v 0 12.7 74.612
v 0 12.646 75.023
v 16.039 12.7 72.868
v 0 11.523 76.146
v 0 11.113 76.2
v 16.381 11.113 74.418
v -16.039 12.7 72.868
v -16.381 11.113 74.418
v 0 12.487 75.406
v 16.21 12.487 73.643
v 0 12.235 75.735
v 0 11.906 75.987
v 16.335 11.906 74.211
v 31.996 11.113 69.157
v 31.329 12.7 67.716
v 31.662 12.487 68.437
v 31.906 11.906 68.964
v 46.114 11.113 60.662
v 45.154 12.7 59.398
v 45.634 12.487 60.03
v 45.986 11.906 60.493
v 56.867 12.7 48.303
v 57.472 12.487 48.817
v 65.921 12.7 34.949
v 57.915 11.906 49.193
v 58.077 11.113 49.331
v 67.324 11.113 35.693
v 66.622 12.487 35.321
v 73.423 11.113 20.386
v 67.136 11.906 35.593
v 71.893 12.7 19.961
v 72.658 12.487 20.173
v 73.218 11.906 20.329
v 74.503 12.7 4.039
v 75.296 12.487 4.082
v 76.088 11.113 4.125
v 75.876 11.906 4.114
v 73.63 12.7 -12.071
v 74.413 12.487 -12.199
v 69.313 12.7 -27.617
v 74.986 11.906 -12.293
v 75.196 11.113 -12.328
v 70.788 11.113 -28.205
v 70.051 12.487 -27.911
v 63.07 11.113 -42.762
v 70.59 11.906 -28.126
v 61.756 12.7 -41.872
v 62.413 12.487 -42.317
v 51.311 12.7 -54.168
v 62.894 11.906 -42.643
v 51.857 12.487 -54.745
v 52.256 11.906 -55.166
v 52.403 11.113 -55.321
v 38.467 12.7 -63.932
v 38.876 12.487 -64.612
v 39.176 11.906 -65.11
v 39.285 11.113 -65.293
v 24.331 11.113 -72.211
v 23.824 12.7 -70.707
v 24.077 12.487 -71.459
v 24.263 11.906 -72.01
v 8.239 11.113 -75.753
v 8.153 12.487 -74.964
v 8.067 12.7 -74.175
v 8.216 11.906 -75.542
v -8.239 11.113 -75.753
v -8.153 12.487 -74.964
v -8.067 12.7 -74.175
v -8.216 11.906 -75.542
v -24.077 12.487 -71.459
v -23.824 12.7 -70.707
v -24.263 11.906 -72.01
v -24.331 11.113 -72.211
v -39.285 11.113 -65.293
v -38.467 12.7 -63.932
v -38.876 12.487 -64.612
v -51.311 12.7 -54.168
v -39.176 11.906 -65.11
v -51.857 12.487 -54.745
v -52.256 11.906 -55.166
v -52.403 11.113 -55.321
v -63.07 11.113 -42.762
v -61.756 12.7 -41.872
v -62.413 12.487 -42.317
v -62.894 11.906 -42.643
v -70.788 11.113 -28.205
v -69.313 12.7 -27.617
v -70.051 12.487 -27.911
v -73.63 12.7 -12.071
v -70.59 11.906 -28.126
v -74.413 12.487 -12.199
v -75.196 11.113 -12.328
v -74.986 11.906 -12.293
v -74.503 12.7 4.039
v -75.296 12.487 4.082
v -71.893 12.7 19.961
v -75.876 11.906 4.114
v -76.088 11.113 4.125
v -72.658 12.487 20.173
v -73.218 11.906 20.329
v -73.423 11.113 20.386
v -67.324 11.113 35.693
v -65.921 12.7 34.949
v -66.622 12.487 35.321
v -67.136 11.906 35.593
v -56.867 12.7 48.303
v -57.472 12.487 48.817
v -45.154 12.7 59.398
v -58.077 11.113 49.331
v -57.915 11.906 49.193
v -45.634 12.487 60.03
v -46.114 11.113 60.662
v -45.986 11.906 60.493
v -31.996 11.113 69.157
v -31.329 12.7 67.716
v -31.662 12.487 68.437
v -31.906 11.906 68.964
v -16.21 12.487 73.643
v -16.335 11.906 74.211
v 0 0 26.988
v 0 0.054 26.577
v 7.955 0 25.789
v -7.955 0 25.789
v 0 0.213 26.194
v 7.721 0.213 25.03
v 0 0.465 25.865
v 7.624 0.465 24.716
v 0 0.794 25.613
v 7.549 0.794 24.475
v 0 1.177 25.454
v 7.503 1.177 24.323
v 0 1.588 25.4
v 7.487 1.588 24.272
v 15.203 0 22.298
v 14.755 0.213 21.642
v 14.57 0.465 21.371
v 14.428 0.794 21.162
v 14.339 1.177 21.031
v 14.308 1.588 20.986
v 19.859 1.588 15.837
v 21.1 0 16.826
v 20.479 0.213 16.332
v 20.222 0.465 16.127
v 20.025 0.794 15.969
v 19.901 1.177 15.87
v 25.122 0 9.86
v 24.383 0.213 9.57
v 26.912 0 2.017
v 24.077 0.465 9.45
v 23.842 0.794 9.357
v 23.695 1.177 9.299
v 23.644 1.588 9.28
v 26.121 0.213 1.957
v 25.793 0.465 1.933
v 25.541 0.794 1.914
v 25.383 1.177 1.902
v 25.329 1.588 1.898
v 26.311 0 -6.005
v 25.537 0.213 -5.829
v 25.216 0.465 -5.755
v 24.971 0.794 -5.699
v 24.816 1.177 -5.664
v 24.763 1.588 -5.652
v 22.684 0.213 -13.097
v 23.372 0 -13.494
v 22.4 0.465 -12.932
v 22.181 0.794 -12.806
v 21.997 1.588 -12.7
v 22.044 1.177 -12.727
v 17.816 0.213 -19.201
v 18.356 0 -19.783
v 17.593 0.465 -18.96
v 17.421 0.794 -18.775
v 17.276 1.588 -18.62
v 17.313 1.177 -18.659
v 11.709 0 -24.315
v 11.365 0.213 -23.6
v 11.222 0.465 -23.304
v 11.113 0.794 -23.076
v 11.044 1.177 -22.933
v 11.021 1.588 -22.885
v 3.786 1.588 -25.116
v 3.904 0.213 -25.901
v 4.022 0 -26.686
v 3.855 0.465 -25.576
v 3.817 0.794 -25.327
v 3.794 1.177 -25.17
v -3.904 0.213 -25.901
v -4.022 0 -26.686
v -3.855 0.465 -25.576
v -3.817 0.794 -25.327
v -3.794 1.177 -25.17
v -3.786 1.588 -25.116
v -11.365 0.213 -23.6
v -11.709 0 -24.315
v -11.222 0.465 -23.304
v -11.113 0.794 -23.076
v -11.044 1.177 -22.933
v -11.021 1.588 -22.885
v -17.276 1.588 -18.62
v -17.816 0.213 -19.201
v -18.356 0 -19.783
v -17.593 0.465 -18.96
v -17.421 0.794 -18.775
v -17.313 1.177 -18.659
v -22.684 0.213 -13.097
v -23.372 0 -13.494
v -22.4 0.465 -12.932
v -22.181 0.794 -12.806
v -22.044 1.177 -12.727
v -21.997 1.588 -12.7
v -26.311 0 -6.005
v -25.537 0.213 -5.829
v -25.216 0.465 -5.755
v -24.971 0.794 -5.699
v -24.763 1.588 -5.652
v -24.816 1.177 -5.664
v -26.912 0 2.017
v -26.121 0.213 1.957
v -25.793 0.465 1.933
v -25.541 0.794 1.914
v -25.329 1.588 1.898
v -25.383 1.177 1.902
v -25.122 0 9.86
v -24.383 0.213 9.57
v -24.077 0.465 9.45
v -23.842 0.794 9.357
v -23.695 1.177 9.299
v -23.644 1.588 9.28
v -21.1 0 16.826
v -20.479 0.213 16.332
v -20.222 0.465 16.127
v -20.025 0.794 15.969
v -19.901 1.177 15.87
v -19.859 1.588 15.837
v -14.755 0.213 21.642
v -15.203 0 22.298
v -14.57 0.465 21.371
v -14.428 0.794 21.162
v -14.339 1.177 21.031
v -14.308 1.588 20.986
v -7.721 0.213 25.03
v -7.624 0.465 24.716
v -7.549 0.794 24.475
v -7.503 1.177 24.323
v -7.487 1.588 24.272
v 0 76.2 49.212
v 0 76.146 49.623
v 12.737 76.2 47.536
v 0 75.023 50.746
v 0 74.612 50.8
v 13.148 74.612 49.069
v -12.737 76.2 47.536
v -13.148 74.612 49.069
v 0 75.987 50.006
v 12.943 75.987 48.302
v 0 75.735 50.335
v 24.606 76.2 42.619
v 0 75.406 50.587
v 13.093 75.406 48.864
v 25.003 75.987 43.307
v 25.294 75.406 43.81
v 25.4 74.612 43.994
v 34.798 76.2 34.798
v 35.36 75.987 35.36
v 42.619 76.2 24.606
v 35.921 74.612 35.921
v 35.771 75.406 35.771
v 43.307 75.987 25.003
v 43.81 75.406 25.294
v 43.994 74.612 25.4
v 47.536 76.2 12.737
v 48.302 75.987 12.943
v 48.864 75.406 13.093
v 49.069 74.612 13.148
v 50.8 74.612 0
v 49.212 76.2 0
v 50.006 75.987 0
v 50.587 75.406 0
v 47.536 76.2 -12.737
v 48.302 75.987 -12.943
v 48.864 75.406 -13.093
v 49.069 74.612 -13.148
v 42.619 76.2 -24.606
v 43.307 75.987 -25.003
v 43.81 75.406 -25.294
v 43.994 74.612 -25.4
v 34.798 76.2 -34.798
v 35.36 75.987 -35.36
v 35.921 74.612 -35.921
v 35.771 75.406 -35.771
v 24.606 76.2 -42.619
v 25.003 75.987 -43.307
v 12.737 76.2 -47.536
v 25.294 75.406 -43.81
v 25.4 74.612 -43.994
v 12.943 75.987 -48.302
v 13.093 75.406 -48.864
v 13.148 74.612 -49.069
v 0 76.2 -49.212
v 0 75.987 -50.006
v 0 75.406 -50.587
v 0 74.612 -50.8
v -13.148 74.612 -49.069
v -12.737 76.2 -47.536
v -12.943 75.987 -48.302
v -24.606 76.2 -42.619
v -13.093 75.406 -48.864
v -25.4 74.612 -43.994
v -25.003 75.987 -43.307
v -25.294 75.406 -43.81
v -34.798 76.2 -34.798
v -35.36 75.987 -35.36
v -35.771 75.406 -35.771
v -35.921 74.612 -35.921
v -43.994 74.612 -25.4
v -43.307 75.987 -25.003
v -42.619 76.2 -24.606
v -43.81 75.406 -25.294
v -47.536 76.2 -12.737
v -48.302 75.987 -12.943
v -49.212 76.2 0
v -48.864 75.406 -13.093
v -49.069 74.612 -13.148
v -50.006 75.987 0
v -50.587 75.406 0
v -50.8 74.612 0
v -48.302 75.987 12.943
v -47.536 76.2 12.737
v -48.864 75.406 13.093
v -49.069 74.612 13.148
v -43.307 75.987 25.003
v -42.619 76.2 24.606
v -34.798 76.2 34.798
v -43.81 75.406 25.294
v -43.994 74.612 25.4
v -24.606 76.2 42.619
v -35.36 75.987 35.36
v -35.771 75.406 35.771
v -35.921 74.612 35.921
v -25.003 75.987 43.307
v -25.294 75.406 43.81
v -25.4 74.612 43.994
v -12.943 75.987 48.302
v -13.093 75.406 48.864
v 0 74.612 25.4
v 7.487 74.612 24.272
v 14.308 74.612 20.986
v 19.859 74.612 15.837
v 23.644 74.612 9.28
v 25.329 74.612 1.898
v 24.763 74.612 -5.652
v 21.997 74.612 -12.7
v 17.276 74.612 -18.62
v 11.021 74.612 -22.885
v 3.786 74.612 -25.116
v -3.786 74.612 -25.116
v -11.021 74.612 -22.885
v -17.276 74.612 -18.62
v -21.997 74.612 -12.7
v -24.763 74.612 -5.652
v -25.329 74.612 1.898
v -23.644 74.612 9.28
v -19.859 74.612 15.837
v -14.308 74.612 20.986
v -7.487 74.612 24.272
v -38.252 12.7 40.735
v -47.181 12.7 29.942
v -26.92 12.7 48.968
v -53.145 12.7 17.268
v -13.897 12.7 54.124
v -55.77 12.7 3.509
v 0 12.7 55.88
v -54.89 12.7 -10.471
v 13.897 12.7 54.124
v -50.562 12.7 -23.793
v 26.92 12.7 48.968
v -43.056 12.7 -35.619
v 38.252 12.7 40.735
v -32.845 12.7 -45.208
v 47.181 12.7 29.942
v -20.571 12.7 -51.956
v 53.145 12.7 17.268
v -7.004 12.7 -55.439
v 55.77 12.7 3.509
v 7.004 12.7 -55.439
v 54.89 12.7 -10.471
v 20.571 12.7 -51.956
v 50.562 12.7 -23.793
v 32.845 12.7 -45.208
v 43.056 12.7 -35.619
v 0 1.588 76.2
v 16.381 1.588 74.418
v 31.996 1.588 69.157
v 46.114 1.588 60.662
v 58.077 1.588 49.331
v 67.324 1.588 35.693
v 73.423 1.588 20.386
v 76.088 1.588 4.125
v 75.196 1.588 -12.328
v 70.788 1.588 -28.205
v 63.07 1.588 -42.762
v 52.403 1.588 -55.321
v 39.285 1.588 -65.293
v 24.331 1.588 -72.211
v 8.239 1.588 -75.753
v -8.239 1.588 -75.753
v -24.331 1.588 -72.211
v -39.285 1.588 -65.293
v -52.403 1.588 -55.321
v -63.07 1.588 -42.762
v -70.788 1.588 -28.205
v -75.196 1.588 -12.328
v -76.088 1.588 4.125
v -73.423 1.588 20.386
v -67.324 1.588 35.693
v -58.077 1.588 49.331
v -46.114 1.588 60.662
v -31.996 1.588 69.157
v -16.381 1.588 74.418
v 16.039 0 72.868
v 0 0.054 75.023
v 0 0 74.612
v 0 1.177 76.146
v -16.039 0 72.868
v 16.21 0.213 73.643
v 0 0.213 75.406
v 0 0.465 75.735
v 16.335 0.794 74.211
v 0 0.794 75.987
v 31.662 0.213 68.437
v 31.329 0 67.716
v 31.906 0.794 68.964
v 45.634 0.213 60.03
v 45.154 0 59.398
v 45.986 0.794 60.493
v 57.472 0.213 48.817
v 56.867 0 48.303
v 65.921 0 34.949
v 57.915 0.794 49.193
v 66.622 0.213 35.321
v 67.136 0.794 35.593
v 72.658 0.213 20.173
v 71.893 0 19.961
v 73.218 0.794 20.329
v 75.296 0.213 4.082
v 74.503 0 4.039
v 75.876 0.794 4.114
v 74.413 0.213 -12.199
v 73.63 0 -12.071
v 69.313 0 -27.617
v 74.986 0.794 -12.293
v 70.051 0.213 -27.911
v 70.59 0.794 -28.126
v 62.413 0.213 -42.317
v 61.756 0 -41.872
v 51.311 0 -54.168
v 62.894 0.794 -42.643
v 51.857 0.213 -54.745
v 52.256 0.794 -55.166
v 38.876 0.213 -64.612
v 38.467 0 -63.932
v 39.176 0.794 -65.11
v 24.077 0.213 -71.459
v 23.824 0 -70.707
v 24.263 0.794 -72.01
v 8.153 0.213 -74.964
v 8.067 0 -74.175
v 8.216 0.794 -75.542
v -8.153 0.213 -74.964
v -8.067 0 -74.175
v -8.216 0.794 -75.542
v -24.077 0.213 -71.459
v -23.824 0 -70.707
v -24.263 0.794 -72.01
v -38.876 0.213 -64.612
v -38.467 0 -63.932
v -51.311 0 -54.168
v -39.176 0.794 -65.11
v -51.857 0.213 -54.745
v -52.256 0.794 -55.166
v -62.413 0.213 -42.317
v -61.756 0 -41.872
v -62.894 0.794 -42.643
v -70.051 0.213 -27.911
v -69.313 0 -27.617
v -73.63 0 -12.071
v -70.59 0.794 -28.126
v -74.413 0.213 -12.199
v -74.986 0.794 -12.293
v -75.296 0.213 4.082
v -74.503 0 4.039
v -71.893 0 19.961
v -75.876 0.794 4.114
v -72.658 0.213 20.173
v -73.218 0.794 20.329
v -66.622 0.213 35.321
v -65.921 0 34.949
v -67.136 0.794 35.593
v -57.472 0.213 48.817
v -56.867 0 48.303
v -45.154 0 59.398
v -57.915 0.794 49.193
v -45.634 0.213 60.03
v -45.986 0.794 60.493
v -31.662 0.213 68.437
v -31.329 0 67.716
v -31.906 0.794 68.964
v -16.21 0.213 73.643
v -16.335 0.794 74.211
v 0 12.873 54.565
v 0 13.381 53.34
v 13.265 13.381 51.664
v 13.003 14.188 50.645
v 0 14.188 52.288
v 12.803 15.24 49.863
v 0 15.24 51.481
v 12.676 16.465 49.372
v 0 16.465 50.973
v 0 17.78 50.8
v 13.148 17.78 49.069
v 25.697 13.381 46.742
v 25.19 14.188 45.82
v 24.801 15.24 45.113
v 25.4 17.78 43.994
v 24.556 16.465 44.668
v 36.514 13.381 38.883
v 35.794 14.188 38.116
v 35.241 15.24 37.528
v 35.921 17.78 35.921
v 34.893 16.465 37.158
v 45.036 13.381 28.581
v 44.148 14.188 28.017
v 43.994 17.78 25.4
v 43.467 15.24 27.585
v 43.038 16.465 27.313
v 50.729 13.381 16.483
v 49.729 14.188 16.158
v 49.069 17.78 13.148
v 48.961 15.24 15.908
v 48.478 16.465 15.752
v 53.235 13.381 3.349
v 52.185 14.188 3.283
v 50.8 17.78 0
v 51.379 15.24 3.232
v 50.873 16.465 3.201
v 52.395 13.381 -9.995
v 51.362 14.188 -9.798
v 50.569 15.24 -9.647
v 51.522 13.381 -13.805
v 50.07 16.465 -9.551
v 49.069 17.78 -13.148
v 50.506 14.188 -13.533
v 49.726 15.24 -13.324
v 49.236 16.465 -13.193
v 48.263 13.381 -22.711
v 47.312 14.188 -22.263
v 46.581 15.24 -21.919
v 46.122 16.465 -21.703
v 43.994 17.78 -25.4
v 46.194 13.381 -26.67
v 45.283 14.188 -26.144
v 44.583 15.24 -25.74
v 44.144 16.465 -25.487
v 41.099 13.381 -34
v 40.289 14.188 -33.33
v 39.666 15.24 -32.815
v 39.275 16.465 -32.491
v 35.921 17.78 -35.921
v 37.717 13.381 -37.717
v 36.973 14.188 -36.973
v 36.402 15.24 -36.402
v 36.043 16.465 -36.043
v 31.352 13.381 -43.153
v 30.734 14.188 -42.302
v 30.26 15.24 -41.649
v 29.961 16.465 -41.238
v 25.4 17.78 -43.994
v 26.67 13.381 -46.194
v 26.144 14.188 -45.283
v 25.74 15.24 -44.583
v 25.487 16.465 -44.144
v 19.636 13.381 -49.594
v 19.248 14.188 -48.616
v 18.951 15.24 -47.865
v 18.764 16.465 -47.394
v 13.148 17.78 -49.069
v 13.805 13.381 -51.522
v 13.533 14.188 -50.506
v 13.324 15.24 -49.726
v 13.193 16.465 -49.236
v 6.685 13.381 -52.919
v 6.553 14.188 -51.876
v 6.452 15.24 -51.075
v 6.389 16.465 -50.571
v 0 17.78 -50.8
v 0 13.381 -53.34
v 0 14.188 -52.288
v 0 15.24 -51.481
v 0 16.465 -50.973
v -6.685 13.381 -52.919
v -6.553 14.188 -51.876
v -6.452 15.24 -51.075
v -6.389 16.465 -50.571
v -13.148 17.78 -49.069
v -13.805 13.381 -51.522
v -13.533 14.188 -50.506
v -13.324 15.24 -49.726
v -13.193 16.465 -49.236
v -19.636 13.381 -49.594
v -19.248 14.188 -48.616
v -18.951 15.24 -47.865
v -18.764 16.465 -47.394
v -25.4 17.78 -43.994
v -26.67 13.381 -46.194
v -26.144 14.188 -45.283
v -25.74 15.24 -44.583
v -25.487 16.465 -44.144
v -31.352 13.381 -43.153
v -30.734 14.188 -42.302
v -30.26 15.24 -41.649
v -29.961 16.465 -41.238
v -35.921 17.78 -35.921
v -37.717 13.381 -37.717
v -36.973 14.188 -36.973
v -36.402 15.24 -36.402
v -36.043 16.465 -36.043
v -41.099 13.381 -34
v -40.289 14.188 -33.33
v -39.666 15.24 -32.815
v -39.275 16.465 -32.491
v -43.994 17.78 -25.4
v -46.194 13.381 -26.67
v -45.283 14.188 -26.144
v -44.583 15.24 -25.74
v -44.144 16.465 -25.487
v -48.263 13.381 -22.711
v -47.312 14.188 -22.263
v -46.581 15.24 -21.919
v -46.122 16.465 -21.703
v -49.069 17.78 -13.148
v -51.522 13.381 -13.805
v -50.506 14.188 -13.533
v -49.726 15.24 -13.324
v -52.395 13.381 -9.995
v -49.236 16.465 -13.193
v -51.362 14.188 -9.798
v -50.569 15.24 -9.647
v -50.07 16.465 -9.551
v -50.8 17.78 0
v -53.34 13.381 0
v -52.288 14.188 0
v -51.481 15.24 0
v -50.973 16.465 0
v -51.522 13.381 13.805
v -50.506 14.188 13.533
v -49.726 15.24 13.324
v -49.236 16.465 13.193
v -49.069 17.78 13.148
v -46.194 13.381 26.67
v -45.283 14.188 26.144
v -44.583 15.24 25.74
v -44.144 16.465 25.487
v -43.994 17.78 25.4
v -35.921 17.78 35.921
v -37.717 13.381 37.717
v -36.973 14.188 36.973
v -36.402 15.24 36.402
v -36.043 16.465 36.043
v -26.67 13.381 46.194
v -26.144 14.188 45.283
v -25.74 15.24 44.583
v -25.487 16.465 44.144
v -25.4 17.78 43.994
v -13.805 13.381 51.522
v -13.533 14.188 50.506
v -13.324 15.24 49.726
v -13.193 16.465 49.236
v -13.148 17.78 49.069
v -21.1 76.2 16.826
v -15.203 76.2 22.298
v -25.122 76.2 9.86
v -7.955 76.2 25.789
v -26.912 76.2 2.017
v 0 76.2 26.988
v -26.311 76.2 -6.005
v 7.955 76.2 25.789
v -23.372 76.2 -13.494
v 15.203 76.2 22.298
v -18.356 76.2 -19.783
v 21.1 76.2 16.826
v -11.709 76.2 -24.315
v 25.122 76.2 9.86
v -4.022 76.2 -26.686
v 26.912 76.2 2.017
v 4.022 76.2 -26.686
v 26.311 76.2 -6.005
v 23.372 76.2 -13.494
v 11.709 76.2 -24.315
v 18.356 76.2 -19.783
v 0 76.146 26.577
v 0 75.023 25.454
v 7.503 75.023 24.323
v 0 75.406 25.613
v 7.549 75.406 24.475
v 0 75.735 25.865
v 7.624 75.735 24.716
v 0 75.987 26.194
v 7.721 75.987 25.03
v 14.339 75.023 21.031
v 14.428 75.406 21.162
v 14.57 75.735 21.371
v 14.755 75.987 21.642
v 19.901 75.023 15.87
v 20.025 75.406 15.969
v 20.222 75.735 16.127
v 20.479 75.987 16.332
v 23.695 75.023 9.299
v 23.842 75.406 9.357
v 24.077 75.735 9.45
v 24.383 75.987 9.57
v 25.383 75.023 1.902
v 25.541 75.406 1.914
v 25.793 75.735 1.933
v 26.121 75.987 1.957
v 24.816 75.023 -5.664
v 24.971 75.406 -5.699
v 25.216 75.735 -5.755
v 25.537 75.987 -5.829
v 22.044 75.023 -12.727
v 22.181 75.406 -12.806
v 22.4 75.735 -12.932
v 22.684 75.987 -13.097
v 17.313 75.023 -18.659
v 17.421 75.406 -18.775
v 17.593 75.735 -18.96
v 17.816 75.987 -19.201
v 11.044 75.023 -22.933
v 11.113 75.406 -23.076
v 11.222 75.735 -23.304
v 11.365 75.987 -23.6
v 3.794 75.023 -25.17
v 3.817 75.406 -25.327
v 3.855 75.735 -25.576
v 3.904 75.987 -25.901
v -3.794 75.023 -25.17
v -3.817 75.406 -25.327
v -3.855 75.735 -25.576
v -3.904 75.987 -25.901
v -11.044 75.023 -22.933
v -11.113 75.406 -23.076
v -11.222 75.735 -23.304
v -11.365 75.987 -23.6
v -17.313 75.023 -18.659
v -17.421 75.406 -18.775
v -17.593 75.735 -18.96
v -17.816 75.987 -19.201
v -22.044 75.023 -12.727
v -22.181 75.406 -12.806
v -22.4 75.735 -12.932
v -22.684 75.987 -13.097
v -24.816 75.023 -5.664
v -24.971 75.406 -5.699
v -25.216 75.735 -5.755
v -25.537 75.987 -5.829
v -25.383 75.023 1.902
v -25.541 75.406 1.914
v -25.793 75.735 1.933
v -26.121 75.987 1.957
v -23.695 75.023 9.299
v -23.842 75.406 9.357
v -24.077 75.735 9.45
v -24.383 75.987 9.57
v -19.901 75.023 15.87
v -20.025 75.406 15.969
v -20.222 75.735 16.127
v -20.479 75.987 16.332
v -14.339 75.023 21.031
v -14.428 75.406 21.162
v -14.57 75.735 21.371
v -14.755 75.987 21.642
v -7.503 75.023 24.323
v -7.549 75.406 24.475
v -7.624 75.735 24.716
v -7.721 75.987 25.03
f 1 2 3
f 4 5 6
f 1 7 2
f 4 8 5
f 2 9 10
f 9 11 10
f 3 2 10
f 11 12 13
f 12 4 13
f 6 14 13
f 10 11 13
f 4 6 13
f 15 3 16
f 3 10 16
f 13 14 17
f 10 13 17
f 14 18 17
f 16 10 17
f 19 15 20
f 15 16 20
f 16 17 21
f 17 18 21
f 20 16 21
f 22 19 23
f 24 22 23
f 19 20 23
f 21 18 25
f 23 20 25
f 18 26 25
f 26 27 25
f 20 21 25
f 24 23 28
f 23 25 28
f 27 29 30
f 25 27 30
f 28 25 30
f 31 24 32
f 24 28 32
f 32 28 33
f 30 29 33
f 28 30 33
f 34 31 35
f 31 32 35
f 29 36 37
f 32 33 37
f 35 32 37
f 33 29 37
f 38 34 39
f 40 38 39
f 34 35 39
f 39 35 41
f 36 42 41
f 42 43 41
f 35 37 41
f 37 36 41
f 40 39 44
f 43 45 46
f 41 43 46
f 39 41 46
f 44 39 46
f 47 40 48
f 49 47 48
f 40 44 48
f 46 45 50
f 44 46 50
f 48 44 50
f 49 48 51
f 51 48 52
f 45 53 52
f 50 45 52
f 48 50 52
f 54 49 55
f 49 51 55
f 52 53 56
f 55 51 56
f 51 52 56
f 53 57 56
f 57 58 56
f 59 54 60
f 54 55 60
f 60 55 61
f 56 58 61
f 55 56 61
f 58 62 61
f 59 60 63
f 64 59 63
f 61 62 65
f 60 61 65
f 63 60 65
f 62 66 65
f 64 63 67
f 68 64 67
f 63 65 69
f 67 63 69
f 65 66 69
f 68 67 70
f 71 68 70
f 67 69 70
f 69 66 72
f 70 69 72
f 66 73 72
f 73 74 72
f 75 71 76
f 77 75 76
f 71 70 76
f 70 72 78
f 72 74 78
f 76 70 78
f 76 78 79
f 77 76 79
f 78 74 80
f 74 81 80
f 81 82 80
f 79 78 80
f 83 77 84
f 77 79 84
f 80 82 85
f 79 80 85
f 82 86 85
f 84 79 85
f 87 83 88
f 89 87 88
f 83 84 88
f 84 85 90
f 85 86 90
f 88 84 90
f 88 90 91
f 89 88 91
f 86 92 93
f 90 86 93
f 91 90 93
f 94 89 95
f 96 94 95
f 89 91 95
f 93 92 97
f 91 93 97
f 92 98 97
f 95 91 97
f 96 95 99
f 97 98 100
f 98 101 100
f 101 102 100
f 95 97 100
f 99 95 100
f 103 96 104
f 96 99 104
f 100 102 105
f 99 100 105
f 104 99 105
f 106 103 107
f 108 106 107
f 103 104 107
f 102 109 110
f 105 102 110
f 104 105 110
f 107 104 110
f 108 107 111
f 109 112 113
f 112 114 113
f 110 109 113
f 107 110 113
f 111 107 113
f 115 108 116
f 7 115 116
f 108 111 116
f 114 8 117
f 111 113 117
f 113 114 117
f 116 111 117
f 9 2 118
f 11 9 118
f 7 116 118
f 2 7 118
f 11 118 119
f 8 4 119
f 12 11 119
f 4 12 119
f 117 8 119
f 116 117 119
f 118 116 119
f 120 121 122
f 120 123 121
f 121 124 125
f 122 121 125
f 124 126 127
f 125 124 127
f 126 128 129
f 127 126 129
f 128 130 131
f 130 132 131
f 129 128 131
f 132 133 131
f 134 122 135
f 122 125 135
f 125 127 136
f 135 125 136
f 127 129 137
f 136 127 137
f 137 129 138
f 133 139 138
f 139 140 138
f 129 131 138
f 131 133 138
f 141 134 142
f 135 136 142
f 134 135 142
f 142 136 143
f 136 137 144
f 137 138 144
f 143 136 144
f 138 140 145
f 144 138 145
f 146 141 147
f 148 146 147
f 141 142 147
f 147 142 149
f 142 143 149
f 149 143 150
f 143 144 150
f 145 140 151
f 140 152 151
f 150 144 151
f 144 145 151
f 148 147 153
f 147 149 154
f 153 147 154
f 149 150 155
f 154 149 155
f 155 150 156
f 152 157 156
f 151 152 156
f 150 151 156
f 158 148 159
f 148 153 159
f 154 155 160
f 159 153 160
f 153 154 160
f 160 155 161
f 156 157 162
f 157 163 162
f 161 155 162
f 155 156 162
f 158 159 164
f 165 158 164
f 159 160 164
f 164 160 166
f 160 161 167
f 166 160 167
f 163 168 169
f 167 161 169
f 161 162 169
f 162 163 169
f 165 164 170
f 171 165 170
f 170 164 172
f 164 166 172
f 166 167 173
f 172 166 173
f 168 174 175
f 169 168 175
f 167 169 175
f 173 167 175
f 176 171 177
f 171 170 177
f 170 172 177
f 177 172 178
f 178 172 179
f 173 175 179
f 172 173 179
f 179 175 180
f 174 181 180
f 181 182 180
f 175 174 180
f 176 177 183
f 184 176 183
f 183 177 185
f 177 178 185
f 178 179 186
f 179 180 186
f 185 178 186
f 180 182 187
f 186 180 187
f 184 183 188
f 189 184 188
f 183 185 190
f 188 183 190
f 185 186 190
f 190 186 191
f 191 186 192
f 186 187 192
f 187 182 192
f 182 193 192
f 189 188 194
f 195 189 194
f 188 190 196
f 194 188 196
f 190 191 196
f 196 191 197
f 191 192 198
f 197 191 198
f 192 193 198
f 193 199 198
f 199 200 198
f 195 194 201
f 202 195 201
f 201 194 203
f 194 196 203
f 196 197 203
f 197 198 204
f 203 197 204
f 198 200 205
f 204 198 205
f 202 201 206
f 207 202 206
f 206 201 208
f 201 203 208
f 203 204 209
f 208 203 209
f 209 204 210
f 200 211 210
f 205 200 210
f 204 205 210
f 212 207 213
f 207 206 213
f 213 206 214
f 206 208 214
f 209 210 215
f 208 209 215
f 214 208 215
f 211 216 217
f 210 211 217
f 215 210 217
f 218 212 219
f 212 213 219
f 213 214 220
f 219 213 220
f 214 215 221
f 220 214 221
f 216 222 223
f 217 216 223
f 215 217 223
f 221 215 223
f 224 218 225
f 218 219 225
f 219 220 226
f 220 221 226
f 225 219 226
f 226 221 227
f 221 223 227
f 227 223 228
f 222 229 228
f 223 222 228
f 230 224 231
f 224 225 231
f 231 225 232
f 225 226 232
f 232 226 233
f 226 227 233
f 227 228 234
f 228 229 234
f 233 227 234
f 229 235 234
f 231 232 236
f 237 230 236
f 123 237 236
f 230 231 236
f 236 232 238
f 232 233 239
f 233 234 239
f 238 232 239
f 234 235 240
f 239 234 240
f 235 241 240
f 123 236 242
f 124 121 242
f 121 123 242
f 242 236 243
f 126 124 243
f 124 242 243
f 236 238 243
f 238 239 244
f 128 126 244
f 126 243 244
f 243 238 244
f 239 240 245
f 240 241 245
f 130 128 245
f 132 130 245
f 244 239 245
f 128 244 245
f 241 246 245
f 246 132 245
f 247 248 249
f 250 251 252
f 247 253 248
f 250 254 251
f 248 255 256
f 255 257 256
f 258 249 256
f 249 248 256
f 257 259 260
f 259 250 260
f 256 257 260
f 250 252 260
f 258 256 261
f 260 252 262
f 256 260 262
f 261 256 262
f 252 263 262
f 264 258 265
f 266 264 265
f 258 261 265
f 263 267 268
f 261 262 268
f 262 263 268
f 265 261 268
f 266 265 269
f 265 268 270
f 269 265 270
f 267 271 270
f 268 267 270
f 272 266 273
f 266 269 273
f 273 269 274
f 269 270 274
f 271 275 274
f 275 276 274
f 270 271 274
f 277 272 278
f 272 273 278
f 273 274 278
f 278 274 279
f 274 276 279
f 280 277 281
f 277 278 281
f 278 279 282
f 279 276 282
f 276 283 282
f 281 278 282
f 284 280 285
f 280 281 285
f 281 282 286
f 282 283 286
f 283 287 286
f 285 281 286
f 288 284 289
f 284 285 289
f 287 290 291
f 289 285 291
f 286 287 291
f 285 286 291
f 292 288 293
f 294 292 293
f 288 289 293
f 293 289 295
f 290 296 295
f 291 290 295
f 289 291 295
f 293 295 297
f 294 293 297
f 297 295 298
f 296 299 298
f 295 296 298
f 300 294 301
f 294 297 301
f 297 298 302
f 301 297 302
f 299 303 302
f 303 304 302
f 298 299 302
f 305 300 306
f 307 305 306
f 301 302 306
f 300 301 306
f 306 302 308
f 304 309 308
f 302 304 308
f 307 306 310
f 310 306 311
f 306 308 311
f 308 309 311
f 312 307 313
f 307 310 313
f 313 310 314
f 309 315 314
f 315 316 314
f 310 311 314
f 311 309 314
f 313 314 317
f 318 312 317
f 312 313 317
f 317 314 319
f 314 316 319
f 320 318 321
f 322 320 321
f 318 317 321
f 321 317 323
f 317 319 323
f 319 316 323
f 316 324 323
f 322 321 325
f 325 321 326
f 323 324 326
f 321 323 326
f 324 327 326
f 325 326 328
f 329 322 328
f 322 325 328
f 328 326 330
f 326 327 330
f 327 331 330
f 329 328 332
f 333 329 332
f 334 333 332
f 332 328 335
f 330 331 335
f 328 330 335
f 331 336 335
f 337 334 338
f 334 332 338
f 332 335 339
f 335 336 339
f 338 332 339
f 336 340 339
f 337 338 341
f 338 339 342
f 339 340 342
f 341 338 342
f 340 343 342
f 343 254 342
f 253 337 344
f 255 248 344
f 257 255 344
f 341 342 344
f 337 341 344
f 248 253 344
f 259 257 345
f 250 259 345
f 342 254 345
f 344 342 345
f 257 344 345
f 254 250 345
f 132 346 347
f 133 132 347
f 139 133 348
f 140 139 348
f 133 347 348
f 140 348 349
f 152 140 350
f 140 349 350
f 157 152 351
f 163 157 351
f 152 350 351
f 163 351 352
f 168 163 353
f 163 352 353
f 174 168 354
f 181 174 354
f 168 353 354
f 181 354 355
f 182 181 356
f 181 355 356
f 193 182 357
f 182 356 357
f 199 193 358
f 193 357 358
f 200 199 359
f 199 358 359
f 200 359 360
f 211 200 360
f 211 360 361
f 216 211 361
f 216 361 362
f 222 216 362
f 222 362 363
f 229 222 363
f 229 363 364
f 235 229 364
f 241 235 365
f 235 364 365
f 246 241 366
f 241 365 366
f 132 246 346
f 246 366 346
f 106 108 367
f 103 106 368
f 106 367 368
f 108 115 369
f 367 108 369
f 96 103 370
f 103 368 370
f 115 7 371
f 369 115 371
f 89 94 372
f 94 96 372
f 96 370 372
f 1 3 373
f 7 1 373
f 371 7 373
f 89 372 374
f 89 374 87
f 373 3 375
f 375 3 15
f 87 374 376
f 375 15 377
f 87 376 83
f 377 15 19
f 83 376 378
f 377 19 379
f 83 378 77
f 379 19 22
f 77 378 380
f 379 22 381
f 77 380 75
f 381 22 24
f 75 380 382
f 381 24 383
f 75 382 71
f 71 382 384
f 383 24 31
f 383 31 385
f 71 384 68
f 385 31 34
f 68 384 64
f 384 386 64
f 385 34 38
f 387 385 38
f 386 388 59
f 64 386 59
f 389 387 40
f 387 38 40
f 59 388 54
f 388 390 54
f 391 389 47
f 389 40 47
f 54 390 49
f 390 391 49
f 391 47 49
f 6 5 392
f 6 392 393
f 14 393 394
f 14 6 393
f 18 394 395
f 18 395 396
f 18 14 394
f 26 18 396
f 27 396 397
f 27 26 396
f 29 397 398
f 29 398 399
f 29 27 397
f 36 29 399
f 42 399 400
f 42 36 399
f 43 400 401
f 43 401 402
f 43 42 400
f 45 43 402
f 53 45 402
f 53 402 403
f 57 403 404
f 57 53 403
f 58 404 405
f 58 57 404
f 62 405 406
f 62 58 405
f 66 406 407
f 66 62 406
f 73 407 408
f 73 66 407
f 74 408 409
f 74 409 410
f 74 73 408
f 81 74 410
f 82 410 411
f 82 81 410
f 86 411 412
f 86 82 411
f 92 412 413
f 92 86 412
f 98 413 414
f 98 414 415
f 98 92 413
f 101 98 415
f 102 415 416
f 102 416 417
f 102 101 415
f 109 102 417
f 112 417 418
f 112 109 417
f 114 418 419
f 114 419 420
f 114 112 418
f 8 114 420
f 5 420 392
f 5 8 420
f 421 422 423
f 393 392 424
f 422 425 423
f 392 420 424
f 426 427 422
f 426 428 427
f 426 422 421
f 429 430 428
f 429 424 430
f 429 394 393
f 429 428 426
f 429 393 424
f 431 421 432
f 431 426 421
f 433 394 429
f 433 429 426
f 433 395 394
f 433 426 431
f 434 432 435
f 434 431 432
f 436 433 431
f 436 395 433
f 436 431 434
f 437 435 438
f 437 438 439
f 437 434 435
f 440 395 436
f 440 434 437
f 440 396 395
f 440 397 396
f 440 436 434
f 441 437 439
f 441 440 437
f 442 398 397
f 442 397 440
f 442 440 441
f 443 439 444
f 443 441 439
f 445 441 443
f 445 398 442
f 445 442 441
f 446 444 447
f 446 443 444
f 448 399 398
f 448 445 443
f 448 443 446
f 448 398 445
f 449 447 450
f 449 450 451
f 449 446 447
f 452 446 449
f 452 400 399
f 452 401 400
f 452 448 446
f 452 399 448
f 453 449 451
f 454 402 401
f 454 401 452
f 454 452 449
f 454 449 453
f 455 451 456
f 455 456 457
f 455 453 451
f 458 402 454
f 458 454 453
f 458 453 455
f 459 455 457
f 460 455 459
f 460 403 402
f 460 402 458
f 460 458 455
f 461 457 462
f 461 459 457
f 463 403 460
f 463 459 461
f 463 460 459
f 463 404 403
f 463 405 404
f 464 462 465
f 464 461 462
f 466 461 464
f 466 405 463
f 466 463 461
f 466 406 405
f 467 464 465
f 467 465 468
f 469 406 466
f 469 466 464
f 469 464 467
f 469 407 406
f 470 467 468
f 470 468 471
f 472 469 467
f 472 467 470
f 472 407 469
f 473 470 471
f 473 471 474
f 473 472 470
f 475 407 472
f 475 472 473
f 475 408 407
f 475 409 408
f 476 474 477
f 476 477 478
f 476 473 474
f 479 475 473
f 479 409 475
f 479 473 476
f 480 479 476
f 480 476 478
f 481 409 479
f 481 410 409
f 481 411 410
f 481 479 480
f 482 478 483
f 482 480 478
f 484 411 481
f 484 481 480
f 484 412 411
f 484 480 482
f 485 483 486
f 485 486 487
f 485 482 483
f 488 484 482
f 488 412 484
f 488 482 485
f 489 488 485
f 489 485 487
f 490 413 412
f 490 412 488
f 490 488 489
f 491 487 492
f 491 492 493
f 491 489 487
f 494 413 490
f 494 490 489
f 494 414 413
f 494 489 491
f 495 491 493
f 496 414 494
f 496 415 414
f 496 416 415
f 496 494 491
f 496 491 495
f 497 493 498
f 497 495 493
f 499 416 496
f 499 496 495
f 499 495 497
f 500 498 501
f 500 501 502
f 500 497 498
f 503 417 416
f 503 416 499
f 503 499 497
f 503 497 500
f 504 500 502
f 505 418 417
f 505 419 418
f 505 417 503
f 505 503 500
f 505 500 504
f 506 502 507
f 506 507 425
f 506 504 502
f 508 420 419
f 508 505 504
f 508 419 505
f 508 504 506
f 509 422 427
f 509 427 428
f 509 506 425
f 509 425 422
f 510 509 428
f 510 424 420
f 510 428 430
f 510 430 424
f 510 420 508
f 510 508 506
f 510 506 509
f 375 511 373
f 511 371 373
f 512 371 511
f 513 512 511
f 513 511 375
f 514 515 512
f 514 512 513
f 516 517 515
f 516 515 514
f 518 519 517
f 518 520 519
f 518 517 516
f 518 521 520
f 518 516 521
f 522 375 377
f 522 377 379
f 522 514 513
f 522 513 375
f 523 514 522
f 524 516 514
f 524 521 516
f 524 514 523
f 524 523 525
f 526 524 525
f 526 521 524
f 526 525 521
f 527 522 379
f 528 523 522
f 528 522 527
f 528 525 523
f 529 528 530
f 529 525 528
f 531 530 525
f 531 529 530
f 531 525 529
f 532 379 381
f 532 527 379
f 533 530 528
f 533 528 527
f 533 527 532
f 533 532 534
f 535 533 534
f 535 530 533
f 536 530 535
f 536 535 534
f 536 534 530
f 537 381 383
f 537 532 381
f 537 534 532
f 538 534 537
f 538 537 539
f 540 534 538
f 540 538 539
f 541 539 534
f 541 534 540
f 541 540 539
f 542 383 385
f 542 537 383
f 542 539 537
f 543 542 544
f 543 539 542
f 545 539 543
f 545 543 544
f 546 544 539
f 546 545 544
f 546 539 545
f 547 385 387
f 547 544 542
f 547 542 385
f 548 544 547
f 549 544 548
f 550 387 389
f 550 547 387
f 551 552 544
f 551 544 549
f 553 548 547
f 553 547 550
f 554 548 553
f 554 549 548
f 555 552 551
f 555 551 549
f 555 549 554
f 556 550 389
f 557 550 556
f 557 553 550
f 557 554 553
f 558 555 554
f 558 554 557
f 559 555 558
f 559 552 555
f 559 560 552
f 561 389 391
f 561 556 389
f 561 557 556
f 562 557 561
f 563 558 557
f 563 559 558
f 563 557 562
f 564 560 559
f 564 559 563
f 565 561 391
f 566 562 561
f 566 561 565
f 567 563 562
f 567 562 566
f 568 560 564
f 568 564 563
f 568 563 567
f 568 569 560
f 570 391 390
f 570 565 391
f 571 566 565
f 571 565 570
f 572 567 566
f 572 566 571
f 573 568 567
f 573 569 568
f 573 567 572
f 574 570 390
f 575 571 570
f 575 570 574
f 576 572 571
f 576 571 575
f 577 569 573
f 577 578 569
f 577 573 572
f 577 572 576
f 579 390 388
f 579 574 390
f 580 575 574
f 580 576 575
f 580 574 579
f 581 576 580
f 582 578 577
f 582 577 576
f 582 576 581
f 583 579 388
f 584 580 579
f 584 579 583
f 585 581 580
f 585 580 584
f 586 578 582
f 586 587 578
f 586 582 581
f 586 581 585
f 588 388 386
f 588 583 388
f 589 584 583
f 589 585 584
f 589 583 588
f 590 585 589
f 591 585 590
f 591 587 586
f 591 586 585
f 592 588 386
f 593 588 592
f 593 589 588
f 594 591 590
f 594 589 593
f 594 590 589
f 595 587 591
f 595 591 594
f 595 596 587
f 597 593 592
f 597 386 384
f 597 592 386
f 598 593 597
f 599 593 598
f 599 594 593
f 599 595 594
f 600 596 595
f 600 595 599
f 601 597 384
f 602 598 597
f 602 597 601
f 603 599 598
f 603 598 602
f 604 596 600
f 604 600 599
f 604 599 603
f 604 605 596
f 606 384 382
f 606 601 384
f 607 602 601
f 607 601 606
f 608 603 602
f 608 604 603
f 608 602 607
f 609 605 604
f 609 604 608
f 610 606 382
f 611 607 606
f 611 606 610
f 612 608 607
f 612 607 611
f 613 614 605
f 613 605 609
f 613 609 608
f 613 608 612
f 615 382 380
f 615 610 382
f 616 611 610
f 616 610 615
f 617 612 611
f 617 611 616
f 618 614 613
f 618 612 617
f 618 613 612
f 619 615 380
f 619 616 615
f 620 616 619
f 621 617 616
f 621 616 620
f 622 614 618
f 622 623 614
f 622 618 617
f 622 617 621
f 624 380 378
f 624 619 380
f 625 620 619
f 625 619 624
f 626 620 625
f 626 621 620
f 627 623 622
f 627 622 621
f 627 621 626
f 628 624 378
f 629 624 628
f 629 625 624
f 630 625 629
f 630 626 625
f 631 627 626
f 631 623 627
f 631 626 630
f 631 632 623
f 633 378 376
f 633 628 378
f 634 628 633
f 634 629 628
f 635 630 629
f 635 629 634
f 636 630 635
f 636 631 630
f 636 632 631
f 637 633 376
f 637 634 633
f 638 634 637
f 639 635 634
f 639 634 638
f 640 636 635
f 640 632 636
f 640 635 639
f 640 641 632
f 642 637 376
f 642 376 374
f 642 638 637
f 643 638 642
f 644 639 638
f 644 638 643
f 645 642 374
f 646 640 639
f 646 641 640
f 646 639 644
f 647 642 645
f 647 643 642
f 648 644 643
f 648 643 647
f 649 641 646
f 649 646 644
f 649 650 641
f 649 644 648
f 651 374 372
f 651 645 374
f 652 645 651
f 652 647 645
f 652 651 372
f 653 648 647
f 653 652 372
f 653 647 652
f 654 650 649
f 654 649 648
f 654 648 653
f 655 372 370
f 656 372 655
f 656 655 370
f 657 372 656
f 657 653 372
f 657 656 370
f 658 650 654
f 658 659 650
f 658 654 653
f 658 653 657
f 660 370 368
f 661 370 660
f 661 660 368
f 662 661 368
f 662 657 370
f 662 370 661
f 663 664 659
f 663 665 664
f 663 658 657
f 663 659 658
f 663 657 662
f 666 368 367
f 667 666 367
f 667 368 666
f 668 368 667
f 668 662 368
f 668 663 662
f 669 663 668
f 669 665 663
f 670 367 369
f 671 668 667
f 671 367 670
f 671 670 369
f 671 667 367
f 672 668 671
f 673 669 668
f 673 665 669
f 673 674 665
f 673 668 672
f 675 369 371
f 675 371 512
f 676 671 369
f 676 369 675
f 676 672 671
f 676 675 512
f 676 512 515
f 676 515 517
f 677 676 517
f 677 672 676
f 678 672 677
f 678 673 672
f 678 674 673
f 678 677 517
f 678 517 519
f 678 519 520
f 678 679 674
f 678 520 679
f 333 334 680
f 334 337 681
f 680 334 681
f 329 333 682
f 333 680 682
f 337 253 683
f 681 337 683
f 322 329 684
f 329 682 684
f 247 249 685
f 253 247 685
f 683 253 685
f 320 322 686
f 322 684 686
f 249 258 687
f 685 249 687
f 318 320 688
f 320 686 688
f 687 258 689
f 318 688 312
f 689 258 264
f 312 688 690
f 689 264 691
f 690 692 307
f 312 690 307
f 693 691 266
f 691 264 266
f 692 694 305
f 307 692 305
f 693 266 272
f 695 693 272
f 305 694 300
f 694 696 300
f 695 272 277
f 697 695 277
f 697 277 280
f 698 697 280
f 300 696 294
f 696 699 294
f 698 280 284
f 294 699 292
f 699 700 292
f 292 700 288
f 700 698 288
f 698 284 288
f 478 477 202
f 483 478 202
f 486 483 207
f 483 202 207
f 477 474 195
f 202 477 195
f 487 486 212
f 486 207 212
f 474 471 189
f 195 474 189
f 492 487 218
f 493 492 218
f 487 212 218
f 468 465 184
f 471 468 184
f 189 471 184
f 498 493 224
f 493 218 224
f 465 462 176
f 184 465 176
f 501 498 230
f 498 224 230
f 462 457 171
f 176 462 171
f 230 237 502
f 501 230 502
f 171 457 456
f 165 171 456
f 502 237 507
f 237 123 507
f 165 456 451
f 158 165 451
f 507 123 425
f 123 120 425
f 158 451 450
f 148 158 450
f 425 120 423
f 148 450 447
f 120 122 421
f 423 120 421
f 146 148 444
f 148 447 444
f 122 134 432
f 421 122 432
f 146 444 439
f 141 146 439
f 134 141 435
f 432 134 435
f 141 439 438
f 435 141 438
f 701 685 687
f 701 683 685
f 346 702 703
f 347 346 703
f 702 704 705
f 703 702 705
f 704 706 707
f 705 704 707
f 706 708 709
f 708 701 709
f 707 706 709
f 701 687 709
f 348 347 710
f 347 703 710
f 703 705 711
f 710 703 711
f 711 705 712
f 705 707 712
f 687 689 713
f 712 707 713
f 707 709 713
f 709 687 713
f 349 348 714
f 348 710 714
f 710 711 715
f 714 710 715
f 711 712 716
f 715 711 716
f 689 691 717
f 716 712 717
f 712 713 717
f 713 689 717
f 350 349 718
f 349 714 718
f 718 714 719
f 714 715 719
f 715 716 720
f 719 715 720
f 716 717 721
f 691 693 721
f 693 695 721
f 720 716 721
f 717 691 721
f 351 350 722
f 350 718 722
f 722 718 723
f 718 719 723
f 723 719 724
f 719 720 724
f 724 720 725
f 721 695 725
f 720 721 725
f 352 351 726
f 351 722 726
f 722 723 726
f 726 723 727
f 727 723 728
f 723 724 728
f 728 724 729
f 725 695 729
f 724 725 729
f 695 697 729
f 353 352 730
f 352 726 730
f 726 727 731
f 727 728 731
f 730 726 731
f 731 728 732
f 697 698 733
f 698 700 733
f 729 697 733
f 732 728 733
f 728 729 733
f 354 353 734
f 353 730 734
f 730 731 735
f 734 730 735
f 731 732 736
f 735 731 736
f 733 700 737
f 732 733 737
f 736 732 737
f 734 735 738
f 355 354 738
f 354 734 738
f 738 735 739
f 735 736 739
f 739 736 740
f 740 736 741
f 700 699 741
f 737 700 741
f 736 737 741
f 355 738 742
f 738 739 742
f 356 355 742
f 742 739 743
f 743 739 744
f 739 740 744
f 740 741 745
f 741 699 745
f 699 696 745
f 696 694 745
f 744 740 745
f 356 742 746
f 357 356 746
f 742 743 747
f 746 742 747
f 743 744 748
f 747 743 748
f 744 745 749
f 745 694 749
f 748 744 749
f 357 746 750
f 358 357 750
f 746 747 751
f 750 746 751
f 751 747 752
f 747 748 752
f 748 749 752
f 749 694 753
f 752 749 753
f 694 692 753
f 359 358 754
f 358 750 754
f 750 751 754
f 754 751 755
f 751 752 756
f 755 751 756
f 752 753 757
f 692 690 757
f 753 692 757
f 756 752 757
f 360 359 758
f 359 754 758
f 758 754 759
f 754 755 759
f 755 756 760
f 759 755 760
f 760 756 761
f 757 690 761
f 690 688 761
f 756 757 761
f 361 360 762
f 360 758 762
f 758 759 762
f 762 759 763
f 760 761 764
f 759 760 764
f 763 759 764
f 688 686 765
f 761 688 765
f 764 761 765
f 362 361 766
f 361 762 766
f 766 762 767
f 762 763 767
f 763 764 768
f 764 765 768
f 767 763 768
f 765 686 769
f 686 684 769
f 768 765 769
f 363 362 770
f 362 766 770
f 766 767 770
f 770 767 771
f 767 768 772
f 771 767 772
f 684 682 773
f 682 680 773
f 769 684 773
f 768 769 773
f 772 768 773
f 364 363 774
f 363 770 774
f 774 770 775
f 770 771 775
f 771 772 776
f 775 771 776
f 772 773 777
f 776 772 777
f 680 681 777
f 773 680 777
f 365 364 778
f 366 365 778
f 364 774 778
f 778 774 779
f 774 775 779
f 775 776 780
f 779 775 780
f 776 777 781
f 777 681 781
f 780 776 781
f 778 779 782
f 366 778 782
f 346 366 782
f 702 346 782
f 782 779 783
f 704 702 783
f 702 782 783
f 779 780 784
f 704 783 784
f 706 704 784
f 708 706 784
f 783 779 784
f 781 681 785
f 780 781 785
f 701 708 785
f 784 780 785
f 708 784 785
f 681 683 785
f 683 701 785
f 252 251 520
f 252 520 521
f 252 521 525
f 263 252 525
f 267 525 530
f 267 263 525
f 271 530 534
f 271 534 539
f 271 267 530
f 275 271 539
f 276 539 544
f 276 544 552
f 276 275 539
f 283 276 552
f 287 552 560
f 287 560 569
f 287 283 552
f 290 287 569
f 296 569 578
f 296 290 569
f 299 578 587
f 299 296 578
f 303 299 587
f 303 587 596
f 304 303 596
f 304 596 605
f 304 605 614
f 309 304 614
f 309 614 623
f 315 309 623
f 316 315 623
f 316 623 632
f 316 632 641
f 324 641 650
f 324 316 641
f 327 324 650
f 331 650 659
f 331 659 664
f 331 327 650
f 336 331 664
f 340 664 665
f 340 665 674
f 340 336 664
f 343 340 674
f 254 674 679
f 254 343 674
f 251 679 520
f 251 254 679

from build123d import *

# Parameters (mm, degrees)
F0_W   = 12.7
F0_H   = 25.4
F0_W_2 = 63.5
F2_R   = 1.5875
F3_R   = 5.08


with BuildPart() as f1:
    # F0 (on Right) → F1 (revolve)
    with BuildSketch(Plane.YZ):
        with Locations((6.35, 63.5)):
            Rectangle(F0_W, F0_H)
        with Locations((6.35, 38.1)):
            Rectangle(F0_W, F0_H)
        with Locations((44.45, 38.1)):
            Rectangle(F0_W_2, F0_H)
    revolve(axis=Axis((0, 45.261729, 0), (0, 1, 0)))

    # F2
    f2_edges = [f1.edges().sort_by_distance(p)[0] for p in [
        (0, 12.7, -76.2),
        (0, 0, -76.2),
        (0, 76.2, -50.8),
        (0, 76.2, -25.4),
        (0, 0, -25.4),
    ]]
    fillet(f2_edges, radius=F2_R)

    # F3
    f3_edges = [f1.edges().sort_by_distance(p)[0] for p in [
        (0, 12.7, -50.8),
    ]]
    fillet(f3_edges, radius=F3_R)


solid = f1.part
